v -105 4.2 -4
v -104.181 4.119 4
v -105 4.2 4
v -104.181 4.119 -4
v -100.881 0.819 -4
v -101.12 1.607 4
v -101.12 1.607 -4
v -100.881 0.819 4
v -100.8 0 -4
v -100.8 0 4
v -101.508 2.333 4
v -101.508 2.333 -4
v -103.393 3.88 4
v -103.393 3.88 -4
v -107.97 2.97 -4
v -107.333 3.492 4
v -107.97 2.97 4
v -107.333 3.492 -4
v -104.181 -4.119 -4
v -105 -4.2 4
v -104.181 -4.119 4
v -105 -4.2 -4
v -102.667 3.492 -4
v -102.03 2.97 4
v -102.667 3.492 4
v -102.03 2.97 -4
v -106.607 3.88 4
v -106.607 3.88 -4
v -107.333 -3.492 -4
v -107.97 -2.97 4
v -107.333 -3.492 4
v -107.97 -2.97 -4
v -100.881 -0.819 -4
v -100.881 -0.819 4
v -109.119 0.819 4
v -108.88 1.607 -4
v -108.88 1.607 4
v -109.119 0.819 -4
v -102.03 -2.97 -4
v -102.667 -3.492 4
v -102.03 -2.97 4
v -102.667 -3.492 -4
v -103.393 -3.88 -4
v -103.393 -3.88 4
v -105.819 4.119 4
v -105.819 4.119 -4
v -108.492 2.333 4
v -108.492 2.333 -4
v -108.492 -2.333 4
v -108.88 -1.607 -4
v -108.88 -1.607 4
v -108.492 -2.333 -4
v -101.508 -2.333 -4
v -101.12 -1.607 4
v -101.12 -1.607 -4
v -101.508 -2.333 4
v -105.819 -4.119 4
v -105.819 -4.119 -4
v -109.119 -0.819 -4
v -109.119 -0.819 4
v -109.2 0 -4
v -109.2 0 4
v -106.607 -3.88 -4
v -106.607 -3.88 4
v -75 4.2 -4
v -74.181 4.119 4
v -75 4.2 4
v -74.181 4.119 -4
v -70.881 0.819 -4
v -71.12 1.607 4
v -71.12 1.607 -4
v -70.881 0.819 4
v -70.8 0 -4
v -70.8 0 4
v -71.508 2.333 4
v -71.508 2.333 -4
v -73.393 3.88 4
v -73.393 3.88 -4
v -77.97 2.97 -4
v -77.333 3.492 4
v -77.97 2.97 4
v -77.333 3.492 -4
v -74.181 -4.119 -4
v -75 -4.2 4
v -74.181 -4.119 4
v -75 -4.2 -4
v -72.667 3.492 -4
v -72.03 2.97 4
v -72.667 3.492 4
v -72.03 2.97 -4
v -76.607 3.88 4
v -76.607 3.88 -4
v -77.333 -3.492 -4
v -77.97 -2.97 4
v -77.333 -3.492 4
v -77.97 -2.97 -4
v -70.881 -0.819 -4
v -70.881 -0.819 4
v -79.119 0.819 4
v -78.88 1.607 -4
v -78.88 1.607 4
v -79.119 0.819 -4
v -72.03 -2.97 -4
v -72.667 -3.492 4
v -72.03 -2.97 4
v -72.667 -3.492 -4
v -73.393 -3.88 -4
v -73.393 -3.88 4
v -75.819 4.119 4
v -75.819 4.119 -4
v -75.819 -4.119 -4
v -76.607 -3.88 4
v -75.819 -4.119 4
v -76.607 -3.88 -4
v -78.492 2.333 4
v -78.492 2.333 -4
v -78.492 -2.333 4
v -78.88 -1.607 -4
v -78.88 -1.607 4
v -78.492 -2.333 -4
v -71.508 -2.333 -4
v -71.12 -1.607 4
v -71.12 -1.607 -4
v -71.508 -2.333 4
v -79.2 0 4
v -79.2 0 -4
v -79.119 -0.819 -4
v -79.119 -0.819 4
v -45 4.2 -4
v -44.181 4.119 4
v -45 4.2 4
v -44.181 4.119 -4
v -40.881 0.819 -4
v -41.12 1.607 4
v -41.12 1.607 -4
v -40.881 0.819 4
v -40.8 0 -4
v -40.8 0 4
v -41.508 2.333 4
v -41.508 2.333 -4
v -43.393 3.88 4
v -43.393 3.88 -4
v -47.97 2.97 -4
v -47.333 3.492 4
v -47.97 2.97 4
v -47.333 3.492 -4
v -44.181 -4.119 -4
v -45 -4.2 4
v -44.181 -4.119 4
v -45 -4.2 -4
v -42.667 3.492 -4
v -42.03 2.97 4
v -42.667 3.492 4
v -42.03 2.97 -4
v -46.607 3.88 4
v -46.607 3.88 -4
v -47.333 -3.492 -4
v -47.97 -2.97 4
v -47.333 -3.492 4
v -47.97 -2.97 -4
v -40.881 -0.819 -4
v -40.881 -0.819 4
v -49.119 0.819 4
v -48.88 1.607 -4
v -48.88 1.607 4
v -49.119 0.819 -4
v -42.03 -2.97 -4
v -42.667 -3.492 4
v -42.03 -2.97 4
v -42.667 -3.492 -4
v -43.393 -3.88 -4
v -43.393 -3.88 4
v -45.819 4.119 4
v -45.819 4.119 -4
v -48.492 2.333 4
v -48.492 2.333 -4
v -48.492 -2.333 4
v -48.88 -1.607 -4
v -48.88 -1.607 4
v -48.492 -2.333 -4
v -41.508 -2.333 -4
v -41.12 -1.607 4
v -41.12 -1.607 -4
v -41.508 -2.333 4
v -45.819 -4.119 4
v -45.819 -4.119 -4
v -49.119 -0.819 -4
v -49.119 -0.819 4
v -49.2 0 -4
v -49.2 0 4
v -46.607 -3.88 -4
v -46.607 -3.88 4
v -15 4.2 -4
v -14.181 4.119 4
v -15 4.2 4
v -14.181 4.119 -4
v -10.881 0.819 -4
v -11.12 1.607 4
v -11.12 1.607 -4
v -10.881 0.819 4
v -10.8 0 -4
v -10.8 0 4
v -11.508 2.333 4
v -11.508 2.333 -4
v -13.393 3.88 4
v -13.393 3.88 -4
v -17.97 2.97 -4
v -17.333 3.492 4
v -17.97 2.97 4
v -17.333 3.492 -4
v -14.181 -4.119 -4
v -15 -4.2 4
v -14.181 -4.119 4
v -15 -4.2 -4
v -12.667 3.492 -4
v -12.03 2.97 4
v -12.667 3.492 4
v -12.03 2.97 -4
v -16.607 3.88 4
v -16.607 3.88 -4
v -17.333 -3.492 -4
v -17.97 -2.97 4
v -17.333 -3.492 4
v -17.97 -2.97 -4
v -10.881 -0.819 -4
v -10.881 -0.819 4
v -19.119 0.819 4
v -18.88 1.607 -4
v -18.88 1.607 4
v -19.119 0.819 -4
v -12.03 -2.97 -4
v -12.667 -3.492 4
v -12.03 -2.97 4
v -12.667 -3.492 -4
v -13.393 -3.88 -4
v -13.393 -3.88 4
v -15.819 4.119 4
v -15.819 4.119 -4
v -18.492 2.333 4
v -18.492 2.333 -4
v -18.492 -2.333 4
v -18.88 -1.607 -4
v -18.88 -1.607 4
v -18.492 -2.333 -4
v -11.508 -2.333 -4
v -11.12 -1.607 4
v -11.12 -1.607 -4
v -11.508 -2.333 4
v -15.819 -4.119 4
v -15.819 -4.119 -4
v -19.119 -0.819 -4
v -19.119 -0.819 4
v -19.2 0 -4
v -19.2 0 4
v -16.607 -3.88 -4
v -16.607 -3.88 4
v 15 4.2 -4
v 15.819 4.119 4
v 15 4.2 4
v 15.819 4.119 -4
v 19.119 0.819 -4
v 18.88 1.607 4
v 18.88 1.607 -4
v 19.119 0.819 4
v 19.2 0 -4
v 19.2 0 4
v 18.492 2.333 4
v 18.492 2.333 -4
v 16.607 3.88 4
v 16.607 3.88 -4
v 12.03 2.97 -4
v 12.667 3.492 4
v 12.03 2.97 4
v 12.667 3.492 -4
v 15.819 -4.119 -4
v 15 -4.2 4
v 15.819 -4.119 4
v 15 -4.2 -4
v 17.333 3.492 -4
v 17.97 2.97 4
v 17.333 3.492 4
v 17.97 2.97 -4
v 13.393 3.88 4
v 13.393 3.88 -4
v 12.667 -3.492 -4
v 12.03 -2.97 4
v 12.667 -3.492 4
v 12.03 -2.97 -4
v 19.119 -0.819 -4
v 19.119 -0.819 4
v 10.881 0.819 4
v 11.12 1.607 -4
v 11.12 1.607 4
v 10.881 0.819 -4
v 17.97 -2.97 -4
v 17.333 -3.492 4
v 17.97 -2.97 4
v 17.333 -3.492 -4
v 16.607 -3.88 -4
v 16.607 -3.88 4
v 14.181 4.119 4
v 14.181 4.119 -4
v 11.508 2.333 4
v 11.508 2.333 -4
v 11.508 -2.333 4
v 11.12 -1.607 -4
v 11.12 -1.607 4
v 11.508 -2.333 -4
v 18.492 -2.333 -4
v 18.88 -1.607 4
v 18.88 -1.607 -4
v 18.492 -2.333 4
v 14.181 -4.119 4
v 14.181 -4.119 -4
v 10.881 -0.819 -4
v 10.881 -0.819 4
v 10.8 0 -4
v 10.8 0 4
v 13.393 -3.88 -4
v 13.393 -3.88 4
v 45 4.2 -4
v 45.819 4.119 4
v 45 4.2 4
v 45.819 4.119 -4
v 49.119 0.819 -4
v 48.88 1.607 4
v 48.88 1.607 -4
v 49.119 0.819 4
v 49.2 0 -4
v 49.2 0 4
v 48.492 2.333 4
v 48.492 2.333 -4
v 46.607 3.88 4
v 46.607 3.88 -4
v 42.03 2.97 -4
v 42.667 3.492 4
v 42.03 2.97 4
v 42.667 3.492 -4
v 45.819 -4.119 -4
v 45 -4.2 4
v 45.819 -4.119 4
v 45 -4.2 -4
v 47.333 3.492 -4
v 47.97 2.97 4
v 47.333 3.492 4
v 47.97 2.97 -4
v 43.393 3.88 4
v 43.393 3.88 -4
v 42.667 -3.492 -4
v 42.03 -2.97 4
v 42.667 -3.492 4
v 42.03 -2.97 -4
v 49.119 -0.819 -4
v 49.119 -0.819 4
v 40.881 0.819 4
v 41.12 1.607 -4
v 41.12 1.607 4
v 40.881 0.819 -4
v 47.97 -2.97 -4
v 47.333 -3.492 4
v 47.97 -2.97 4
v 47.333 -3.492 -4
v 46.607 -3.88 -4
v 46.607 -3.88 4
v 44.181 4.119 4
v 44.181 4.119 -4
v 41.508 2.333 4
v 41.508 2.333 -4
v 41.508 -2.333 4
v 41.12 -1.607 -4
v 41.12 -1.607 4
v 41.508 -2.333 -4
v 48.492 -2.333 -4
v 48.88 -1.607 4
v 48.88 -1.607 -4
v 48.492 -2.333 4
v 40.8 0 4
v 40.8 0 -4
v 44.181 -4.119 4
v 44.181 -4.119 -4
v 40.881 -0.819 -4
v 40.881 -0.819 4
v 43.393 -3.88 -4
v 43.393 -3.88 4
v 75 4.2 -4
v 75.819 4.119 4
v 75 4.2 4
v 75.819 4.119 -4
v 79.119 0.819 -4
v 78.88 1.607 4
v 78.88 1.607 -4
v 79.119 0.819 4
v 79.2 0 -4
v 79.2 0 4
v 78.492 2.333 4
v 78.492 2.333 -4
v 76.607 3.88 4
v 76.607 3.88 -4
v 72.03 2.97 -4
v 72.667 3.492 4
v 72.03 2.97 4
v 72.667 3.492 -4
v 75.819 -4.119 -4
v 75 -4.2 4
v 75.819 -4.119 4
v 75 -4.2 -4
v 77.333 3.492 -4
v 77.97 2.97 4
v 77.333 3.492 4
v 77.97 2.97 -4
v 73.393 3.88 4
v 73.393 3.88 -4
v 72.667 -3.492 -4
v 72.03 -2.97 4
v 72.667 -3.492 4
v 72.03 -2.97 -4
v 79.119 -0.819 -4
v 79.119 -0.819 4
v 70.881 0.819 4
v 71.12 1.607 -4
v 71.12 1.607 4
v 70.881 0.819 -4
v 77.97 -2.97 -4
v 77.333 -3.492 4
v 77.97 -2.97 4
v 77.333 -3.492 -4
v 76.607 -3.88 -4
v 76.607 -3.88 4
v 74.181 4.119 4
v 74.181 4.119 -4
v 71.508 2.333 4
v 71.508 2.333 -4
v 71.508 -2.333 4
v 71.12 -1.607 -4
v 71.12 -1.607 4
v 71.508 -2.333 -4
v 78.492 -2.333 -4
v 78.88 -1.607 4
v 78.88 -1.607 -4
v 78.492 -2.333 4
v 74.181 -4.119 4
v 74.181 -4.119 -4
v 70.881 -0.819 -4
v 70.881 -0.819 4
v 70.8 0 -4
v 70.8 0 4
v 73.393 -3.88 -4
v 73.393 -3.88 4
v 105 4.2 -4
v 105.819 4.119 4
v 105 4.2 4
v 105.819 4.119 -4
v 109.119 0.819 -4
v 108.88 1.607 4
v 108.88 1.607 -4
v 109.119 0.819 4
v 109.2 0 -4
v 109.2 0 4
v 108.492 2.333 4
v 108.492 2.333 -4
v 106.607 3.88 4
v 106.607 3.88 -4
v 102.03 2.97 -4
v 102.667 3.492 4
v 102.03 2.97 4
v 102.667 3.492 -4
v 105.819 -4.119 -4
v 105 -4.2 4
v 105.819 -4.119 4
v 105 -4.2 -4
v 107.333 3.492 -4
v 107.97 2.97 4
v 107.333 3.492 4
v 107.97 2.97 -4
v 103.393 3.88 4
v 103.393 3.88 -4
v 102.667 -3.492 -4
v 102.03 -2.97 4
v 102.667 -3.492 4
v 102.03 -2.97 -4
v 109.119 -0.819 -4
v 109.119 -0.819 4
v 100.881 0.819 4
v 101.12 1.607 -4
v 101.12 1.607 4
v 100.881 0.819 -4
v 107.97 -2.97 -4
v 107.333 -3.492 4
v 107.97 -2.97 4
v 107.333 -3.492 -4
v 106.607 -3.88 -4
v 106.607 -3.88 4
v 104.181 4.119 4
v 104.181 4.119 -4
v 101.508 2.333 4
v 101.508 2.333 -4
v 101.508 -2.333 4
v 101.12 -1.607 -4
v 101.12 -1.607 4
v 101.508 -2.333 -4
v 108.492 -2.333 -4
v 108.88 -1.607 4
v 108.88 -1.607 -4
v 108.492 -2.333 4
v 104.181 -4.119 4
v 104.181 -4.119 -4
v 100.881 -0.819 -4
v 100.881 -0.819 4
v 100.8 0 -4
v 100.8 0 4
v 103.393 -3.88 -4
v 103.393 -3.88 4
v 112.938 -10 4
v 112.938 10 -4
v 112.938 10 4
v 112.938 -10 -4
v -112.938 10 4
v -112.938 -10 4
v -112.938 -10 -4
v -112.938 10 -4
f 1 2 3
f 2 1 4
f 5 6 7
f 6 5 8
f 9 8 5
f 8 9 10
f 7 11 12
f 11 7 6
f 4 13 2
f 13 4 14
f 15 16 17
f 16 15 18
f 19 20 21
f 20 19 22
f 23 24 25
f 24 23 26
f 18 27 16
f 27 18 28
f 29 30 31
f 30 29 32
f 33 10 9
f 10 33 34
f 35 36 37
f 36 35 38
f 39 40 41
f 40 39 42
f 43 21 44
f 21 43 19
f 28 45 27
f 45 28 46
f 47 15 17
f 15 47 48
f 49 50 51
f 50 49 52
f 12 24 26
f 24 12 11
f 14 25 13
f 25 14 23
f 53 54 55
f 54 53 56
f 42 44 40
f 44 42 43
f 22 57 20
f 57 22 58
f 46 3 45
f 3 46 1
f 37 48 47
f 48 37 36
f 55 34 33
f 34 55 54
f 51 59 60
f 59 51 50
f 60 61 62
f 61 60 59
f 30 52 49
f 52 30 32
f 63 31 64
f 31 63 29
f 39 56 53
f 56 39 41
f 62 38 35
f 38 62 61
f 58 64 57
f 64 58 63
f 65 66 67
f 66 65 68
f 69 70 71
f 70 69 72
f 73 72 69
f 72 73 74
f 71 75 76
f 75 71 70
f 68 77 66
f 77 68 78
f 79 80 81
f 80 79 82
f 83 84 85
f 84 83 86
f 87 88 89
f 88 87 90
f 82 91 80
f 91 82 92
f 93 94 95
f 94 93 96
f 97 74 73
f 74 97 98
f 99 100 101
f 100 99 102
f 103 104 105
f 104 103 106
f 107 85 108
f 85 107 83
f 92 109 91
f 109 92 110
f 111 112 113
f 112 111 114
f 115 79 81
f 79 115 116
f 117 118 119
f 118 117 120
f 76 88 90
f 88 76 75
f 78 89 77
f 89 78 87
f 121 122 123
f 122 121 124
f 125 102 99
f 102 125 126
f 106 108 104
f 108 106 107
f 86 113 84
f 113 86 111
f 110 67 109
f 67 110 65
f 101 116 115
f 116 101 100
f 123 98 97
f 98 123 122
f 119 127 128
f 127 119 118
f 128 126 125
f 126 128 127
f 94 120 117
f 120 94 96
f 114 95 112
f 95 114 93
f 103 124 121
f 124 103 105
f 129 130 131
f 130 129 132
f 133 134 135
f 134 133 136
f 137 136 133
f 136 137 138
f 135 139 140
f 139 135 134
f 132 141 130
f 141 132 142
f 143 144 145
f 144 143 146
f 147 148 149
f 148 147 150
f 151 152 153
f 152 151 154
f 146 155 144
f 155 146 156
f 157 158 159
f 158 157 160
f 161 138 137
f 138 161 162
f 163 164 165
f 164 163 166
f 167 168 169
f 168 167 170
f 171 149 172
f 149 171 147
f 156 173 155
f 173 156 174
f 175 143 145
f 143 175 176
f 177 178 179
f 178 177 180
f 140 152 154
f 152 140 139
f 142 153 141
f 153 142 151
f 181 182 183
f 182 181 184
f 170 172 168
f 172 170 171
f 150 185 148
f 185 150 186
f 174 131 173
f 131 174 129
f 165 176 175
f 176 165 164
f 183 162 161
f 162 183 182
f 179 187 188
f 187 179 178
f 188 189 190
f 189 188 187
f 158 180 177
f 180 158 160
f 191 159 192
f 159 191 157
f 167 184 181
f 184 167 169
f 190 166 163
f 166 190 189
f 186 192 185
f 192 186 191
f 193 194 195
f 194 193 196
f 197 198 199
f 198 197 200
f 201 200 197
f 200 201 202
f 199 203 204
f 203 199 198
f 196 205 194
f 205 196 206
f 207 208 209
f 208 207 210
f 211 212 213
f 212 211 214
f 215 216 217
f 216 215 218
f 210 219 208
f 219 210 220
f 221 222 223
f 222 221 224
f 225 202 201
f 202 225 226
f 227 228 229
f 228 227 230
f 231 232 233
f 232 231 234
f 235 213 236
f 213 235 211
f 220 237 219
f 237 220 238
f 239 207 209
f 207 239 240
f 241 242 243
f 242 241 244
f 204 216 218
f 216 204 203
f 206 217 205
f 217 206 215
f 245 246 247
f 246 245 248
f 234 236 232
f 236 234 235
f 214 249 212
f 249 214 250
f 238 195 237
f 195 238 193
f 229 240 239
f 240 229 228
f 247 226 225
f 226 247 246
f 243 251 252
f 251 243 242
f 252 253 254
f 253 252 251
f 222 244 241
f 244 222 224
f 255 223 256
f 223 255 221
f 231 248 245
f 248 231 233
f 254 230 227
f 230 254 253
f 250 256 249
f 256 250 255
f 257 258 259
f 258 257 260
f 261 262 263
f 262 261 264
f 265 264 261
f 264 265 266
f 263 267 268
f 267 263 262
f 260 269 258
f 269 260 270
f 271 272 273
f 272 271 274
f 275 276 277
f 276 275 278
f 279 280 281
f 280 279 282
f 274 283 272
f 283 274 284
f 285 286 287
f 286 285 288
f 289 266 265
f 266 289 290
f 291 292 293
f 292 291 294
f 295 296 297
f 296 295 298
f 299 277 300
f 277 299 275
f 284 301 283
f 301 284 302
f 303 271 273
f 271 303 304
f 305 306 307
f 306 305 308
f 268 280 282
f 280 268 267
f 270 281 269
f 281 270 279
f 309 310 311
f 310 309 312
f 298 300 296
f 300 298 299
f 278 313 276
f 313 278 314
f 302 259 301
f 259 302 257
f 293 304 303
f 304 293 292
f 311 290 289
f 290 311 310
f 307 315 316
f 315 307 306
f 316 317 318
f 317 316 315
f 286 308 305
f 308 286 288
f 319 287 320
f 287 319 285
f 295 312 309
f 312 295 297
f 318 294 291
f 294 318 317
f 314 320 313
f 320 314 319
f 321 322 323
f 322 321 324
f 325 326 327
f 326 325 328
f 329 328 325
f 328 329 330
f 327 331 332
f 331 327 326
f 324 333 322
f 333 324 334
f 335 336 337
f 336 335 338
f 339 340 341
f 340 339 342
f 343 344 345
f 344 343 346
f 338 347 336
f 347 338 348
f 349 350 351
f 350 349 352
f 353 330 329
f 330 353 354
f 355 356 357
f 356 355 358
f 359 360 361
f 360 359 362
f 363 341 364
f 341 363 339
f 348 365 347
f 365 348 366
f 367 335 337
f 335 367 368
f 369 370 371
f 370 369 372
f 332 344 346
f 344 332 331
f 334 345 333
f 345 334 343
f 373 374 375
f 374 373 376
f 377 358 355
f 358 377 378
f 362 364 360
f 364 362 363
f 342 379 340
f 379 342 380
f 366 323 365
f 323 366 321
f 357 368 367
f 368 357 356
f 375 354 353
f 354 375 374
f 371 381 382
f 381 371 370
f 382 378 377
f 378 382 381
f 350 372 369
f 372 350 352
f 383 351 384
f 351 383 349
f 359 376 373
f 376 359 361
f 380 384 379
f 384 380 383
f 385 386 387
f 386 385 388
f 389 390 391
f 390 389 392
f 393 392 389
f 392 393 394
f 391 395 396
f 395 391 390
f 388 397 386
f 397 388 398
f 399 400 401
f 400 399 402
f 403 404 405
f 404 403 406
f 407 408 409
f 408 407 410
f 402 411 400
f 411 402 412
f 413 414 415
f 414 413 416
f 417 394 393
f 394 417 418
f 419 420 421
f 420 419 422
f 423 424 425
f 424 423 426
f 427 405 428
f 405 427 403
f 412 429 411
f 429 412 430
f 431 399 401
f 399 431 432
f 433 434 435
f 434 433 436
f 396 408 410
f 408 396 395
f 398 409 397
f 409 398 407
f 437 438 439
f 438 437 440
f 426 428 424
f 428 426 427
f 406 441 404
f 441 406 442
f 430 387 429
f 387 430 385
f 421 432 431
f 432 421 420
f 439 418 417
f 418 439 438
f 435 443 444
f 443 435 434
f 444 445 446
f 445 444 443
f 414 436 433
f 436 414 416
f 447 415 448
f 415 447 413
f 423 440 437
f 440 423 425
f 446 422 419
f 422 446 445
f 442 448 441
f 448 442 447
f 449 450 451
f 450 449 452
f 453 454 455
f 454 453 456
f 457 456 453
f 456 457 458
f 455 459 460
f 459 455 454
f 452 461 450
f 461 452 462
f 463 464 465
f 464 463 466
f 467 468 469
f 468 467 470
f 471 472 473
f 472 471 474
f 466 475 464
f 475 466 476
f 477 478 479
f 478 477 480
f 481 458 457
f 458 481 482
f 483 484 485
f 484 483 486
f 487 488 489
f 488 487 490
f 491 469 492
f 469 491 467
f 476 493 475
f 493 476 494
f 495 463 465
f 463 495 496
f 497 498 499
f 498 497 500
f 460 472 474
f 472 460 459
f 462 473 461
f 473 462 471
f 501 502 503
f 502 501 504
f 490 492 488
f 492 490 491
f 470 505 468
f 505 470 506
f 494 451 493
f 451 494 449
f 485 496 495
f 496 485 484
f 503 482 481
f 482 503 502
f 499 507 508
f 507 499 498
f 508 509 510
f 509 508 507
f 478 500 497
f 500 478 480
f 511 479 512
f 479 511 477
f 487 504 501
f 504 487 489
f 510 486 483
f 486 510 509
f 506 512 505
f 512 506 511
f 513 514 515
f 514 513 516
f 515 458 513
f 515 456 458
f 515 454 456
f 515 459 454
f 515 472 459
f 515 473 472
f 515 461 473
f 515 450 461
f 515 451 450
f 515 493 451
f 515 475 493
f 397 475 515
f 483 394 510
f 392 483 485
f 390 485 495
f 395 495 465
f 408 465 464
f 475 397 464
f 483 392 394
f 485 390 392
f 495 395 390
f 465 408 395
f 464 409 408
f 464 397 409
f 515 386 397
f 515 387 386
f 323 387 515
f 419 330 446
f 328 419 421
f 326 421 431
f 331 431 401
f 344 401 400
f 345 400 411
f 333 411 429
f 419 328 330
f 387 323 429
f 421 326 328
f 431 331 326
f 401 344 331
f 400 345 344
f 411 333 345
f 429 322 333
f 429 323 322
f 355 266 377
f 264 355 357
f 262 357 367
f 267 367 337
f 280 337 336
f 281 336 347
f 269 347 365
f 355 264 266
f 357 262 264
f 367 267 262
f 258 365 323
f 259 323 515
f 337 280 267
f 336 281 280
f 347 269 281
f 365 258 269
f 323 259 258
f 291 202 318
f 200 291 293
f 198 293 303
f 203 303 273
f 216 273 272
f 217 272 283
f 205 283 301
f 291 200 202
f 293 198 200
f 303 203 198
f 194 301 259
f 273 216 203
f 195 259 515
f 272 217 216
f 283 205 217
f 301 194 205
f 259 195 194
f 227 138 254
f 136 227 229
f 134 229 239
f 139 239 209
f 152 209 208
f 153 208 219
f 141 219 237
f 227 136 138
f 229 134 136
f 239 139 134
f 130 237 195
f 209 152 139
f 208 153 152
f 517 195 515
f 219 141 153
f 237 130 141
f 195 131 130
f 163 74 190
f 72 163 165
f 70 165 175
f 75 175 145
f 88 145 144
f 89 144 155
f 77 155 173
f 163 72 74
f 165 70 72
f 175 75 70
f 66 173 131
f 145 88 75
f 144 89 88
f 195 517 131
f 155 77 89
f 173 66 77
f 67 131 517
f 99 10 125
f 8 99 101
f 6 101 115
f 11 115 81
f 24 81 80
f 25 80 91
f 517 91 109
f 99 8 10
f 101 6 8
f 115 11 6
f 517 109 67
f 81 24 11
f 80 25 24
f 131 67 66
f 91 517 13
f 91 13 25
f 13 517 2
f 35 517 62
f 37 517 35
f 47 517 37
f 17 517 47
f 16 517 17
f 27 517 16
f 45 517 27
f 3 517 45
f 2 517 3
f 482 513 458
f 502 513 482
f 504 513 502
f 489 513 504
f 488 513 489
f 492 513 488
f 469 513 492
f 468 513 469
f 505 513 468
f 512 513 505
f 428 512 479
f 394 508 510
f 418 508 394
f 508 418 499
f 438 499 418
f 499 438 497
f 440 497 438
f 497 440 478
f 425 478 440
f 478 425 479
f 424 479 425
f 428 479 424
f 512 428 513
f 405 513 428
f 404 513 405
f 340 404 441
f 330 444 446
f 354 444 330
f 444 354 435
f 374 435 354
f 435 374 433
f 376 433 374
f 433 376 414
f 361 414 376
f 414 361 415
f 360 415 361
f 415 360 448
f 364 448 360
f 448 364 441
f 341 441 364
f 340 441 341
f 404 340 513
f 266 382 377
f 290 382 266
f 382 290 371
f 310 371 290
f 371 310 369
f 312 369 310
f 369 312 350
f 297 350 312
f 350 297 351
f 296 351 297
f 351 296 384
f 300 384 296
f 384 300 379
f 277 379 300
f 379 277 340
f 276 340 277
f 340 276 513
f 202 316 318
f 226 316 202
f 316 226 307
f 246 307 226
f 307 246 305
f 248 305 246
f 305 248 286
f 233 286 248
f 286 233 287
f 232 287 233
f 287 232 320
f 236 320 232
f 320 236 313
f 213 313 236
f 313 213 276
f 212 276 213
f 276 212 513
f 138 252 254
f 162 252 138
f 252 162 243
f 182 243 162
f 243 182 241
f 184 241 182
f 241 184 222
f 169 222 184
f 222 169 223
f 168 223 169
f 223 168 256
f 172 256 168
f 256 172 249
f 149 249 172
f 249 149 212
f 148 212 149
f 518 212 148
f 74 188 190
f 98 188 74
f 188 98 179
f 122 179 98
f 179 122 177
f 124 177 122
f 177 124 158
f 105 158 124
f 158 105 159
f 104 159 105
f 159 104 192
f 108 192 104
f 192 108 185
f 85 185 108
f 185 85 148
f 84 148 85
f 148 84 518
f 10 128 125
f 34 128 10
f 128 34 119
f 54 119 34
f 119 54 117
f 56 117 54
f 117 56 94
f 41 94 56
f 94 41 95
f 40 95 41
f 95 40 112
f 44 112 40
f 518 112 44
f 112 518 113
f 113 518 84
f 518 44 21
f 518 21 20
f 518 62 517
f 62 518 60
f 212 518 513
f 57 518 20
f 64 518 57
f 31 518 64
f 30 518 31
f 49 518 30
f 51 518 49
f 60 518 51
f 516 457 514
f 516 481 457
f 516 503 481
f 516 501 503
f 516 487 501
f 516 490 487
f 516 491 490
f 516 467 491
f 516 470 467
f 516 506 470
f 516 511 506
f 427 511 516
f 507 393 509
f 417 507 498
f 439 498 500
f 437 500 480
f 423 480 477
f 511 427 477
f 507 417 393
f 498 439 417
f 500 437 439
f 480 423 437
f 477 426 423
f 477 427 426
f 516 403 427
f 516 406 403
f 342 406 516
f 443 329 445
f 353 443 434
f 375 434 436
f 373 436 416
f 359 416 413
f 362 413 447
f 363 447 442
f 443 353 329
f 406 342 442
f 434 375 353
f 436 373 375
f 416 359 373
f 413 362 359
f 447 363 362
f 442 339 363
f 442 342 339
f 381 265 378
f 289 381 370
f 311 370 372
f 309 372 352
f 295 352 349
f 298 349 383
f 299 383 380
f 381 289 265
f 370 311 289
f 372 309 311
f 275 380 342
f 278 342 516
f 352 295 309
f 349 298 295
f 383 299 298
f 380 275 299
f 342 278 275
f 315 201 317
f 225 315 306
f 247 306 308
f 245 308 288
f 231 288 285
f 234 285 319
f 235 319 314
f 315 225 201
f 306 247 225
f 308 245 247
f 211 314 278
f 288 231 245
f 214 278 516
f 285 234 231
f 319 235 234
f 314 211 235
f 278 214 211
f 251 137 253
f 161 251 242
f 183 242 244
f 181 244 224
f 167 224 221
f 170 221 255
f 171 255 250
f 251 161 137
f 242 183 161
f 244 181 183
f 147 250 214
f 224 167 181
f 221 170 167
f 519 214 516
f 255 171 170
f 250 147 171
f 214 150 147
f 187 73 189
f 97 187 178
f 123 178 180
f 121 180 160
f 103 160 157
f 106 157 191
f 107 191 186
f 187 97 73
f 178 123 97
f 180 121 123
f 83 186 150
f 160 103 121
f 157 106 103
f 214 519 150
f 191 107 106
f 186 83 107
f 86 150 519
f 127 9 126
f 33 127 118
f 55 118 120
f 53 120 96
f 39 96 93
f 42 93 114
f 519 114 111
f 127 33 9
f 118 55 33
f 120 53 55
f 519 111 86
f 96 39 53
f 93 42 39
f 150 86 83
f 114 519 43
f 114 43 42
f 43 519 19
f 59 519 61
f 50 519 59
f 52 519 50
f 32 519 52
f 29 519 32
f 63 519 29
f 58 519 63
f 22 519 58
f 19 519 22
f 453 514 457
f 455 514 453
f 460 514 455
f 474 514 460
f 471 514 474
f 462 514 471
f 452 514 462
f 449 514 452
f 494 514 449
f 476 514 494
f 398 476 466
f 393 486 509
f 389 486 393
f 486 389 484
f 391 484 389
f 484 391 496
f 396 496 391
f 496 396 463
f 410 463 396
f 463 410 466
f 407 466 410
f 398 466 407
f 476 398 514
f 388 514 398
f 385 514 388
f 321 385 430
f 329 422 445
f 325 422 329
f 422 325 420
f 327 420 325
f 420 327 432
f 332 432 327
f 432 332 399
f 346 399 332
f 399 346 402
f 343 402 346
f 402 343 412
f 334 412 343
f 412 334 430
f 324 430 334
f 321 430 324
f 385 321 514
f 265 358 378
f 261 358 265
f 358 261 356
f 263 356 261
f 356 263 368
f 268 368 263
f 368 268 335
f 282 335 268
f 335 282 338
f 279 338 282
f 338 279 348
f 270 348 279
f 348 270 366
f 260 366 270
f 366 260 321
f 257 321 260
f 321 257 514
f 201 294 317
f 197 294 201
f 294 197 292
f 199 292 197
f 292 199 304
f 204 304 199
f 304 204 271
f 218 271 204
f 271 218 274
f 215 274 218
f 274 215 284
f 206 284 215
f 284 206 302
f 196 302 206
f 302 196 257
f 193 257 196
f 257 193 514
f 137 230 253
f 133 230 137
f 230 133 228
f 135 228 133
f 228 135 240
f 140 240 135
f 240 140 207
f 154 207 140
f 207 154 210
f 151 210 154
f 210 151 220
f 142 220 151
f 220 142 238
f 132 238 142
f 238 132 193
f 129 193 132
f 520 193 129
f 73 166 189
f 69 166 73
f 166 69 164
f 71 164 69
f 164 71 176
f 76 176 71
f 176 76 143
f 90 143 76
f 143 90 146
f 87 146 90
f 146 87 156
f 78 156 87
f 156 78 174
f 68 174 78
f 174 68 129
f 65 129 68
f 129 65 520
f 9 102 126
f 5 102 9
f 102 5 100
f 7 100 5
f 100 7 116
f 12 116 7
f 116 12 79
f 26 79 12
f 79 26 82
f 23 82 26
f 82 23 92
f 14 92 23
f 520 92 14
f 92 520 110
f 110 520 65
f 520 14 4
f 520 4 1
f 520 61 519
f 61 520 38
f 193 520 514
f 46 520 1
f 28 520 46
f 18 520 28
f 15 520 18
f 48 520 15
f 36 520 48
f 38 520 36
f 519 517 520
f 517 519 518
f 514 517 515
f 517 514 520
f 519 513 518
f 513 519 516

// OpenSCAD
$fn = 32;

// ----------------------------------------------------------------------
// Hole bar, 8 x Ø8.4
// row layout, 7.9375 mm edge offset
// ----------------------------------------------------------------------

// --- parameters (mm) ---
bar_w = 20;    // bar width (Y)
bar_t = 8;     // bar thickness (Z)
holes = 8;     // holes per row
hole_d = 8.4;  // hole diameter
edge = 7.938;  // offset from the bar end to the first hole
pitch = 30;    // pitch between neighbouring holes

// --- derived feature positions (mm) ---
span = (holes - 1) * pitch;   // = 210   distance between the end holes
bar_l = span + 2 * edge;      // = 225.88   overall bar length
start_x = -bar_l / 2 + edge;  // = -105   X of the first hole
feature_centers = [
  [start_x + 0 * pitch, 0],
  [start_x + 1 * pitch, 0],
  [start_x + 2 * pitch, 0],
  [start_x + 3 * pitch, 0],
  [start_x + 4 * pitch, 0],
  [start_x + 5 * pitch, 0],
  [start_x + 6 * pitch, 0],
  [start_x + 7 * pitch, 0]
];   // hole centres of the first row

// bar with one row of holes, drilled from feature_centers
difference() {
  translate([-bar_l / 2, -bar_w / 2, -bar_t / 2]) cube([bar_l, bar_w, bar_t]);
  for (centre = feature_centers)
    translate([centre[0], centre[1], 0])
      cylinder(d = hole_d, h = bar_t + 2, center = true);
}
